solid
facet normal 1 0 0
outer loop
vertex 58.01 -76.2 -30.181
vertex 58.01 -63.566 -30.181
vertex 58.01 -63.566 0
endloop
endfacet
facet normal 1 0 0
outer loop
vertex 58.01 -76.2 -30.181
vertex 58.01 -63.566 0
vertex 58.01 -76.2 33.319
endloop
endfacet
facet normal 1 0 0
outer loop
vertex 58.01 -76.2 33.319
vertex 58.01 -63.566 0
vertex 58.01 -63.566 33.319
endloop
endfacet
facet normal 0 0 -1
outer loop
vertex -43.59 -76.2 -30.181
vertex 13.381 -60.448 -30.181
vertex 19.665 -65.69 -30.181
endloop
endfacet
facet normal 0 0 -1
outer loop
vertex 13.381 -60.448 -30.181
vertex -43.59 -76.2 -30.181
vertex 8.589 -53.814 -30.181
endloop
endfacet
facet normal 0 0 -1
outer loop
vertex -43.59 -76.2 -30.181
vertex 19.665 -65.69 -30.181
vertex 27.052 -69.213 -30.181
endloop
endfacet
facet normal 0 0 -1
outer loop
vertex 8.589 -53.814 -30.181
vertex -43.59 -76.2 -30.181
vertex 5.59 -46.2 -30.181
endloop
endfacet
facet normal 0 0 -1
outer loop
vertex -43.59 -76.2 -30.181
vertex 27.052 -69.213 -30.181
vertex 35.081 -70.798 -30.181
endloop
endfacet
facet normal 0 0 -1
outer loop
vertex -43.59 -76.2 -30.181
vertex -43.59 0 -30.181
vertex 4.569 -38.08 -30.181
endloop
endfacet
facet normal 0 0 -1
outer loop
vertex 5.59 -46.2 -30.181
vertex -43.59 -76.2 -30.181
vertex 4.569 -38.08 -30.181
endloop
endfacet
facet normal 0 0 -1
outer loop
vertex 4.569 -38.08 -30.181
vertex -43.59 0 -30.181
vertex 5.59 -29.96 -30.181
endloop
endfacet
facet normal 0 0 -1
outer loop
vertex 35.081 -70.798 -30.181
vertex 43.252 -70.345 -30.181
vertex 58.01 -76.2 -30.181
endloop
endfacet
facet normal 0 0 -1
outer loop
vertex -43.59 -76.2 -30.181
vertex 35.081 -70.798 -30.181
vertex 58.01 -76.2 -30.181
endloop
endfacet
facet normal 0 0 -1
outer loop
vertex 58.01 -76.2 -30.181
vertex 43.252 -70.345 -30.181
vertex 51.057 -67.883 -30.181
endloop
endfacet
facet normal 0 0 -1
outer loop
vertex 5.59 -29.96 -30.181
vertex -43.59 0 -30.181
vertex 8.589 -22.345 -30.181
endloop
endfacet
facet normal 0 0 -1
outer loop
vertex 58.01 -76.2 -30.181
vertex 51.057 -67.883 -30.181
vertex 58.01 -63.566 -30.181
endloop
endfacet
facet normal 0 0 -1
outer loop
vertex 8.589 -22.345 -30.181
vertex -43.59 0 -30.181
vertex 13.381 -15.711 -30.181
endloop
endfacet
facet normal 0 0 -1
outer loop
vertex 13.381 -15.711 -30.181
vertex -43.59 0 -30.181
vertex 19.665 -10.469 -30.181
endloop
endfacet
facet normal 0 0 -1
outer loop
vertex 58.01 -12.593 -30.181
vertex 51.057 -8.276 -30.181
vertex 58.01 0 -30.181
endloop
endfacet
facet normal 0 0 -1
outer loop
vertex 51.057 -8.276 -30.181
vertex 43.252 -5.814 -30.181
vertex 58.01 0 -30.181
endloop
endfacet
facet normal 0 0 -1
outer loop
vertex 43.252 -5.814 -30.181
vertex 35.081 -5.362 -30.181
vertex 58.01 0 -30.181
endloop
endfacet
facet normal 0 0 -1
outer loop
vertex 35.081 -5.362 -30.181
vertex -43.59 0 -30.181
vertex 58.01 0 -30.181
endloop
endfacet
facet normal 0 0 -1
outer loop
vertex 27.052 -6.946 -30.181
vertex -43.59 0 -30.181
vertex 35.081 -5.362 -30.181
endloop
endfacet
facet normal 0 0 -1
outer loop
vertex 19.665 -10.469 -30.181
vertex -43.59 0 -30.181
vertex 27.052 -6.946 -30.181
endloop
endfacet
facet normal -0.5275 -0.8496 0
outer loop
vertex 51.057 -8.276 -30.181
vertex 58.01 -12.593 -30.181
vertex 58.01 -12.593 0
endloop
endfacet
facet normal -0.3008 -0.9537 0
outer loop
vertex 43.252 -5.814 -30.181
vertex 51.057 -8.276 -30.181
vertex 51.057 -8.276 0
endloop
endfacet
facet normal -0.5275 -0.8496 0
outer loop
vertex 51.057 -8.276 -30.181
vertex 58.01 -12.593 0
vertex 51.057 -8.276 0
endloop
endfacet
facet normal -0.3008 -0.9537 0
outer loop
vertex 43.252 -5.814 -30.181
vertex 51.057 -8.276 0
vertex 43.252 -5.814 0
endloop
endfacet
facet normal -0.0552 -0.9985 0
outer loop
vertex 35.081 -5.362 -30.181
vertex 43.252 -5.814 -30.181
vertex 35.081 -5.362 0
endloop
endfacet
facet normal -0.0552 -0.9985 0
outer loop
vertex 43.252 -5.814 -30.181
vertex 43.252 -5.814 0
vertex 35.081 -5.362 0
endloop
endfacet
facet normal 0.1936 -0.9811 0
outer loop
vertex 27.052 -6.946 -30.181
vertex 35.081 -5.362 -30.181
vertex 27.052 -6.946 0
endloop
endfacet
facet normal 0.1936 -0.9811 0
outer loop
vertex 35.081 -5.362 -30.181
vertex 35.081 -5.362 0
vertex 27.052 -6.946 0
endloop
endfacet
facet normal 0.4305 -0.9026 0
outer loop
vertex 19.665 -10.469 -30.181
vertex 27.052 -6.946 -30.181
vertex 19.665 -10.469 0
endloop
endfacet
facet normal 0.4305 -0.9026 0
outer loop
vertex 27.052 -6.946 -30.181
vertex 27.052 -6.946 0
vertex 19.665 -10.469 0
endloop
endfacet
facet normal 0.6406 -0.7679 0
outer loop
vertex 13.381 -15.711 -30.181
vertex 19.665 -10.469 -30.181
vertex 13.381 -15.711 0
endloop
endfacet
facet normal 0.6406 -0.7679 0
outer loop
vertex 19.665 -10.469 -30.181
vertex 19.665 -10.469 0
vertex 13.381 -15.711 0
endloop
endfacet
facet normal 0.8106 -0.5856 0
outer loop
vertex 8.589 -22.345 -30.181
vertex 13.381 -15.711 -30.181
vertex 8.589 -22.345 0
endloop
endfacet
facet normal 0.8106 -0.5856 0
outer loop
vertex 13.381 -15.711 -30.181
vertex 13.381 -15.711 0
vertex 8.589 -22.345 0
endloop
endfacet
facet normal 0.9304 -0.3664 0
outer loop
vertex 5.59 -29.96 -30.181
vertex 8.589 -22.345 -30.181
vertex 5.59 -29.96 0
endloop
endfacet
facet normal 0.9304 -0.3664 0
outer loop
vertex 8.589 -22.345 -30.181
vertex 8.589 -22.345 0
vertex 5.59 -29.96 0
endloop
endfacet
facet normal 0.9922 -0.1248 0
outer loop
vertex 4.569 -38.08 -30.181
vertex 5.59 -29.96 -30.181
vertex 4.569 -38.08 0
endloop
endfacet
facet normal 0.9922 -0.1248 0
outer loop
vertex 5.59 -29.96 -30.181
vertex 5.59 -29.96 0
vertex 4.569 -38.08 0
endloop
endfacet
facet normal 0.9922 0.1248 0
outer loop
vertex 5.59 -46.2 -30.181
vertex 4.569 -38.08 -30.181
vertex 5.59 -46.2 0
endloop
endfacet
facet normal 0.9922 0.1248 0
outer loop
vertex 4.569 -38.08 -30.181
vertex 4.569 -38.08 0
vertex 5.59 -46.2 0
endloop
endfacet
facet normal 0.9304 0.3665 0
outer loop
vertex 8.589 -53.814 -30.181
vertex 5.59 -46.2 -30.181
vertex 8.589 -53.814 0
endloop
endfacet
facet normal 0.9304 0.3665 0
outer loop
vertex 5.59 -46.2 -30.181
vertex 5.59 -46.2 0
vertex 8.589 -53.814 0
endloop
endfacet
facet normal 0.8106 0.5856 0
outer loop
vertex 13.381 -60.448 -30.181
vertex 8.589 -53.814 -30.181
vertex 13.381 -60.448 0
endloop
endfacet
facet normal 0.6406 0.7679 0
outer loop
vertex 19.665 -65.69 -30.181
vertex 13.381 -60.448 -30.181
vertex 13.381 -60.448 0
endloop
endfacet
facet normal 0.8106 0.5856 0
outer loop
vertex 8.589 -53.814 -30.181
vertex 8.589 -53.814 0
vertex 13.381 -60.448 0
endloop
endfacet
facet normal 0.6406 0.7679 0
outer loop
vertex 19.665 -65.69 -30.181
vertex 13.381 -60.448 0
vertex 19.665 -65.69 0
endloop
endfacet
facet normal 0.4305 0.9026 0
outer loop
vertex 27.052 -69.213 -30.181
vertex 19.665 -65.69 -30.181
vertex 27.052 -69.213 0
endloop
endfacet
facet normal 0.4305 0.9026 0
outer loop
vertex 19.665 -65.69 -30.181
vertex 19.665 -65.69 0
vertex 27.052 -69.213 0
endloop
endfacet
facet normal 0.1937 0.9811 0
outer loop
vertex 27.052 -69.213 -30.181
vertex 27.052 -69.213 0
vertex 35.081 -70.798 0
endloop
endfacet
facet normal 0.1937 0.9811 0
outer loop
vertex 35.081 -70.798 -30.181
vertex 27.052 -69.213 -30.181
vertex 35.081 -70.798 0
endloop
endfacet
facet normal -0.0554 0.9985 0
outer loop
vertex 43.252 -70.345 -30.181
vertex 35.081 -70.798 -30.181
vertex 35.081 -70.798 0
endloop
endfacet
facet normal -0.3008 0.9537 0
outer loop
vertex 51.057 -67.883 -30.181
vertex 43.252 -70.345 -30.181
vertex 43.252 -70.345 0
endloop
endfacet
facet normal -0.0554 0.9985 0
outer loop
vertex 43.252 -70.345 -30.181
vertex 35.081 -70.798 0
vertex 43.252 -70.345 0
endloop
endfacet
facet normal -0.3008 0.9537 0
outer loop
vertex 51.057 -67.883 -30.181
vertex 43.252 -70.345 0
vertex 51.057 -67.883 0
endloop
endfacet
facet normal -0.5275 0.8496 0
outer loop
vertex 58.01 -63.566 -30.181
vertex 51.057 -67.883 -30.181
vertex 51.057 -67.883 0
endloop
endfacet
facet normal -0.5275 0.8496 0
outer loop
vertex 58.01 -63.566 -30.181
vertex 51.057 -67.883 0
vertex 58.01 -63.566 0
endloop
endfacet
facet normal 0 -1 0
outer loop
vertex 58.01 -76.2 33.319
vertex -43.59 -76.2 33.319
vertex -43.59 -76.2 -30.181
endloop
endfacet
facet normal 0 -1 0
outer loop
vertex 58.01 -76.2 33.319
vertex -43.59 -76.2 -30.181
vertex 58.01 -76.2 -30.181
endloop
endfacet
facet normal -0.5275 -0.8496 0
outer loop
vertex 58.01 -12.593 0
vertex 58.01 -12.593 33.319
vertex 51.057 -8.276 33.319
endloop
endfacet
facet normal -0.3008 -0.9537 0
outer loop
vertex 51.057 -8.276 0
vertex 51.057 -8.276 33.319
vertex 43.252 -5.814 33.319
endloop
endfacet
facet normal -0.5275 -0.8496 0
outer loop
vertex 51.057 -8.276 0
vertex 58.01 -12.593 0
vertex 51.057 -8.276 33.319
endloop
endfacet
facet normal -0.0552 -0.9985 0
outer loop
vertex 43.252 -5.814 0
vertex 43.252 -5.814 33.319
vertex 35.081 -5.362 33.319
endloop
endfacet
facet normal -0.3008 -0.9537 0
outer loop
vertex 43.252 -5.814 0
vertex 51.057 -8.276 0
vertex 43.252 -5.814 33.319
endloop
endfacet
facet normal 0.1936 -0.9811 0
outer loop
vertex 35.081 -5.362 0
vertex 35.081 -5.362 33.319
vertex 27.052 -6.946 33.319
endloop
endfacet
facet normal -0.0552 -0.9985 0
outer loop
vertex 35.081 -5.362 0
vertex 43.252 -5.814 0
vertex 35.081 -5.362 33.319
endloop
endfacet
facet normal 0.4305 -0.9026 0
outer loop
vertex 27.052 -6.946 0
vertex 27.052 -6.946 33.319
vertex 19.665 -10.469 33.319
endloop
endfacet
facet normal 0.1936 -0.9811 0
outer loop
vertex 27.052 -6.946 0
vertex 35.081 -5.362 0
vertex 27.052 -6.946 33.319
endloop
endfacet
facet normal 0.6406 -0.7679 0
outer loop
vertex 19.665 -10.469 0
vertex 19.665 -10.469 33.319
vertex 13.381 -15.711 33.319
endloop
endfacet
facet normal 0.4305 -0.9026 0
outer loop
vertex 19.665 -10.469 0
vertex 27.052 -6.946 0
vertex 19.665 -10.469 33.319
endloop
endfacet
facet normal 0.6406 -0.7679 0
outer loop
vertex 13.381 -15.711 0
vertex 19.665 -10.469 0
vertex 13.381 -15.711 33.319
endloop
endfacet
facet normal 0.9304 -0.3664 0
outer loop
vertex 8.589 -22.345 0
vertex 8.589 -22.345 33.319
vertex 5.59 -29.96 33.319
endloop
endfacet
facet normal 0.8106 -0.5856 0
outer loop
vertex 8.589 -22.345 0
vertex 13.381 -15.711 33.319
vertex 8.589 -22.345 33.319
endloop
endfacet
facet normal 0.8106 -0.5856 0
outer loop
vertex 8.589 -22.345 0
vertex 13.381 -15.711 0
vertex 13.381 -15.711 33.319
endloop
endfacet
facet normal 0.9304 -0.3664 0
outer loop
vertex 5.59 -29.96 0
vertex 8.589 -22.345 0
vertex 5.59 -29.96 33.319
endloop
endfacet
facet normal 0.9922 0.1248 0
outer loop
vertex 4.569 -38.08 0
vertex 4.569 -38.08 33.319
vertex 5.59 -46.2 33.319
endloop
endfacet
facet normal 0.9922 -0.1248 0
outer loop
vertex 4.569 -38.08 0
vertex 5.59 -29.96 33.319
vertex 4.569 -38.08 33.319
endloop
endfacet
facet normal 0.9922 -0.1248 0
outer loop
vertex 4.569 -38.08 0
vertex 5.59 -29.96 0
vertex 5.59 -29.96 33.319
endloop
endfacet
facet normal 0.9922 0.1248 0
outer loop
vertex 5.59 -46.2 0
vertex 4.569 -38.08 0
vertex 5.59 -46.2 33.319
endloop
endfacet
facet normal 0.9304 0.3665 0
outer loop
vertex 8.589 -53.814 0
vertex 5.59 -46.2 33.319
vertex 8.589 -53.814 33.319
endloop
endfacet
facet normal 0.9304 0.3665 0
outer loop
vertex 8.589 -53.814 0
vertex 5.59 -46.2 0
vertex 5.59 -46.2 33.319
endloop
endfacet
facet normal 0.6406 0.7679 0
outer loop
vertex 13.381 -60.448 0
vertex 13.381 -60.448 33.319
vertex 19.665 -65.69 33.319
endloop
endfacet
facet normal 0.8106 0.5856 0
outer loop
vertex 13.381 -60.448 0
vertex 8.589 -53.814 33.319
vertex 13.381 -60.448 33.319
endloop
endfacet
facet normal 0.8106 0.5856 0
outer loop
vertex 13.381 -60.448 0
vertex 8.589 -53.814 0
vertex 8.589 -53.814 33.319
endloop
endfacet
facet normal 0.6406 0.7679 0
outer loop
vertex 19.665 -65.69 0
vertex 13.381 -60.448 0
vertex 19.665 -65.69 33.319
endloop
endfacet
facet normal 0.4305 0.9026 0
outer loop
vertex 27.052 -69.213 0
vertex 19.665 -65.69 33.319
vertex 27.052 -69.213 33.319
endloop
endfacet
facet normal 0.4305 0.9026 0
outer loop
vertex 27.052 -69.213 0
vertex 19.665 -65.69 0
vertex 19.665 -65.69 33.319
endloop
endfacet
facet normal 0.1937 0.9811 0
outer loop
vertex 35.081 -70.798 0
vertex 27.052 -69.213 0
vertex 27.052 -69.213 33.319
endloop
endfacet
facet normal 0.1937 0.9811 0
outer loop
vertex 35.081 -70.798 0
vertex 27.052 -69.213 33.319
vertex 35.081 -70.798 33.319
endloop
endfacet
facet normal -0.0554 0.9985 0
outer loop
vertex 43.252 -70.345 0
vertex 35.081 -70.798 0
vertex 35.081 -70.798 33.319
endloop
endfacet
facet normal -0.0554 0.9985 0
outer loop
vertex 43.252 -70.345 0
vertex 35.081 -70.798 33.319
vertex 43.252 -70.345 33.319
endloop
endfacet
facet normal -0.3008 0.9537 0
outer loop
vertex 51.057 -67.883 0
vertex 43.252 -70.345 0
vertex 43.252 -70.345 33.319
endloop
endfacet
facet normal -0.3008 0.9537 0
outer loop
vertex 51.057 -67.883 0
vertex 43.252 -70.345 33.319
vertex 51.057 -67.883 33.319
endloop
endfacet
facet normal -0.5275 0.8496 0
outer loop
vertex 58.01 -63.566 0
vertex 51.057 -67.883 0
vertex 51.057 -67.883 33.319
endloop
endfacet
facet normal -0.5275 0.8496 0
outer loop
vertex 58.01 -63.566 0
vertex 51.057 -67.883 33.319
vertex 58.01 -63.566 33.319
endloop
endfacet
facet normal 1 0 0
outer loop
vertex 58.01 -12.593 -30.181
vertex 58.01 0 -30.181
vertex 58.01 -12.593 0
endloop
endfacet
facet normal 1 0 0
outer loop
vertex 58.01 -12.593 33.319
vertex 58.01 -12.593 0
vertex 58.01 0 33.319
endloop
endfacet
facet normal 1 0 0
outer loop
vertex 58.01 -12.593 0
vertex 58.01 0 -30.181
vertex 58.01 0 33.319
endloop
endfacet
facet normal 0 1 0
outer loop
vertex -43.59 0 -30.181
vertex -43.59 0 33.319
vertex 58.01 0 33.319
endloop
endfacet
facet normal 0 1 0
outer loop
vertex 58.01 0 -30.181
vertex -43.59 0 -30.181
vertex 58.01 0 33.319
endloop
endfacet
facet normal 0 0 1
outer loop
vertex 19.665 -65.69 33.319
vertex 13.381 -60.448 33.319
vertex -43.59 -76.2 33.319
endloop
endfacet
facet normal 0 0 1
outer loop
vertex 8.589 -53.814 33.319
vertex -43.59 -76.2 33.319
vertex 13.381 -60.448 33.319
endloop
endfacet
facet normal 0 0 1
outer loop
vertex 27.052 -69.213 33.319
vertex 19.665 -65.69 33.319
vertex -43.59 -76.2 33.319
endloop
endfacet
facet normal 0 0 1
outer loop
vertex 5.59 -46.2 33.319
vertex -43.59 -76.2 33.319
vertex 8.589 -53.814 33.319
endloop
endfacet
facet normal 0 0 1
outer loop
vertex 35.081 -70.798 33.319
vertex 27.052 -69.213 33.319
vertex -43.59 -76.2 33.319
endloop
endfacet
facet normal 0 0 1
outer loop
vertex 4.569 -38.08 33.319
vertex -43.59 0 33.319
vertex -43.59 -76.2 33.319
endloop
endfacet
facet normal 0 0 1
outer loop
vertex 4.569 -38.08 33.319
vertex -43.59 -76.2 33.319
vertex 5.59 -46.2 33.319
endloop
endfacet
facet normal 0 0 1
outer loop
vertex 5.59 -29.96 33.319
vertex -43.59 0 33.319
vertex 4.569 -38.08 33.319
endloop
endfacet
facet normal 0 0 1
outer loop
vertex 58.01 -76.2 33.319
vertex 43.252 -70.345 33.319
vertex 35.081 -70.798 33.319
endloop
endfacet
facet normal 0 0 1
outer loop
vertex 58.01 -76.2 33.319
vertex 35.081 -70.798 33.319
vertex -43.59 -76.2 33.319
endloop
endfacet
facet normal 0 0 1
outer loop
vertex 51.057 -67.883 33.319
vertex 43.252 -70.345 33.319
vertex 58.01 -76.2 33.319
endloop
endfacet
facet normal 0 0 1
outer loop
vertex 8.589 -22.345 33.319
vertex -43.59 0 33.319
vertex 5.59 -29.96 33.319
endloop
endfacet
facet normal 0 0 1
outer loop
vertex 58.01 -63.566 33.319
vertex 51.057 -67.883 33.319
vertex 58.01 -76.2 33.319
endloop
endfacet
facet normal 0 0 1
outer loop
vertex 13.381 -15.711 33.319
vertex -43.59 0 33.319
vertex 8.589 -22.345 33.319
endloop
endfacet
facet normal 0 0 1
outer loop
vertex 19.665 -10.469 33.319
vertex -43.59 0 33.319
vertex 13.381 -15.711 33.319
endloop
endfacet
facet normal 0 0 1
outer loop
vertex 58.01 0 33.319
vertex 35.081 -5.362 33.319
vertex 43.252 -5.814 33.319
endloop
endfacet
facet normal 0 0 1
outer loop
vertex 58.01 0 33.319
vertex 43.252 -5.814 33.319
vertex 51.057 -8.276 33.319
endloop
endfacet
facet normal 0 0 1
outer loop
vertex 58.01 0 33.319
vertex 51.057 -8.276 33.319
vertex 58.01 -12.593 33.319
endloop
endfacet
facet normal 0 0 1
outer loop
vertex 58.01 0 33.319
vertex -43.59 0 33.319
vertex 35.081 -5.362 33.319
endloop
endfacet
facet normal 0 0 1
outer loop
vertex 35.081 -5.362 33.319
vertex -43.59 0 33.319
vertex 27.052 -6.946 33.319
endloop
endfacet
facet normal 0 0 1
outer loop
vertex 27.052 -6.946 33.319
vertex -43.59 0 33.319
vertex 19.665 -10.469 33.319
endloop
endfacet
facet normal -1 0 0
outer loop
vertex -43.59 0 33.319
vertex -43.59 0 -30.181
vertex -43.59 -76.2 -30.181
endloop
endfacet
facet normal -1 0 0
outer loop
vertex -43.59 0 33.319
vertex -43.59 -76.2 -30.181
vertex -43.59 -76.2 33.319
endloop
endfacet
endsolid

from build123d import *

# Parameters (mm, degrees)
F0_W     = 101.6
F0_H     = 63.5
F1_DEPTH = 76.2
F2_R     = 32.797713
F3_DEPTH = 127
F4_DEPTH = 127


with BuildPart() as f1:
    # F0 (on Front) → F1 (new body)
    with BuildSketch(Plane.XZ):
        with Locations((7.209563, 1.568823)):
            Rectangle(F0_W, F0_H)
    extrude(amount=F1_DEPTH)

    # F2 (on Top) → F3 (cut)
    with BuildSketch(Plane.XY):
        with Locations((37.366524, -38.079627)):
            Circle(F2_R)
    extrude(amount=F3_DEPTH, mode=Mode.SUBTRACT)

    # F3_face (on face) → F4 (cut)
    with BuildSketch(Plane(origin=(33.622944, -38.079627, 0), x_dir=(1, 0, 0), z_dir=(0, 0, 1))):
        with BuildLine():
            Line((24.386619, -25.486367), (24.386619, 25.486367))
            ThreePointArc((24.386619, 25.486367), (-29.054133, 0), (24.386619, -25.486367))
        make_face()
    extrude(amount=-F4_DEPTH, mode=Mode.SUBTRACT)


solid = f1.part
